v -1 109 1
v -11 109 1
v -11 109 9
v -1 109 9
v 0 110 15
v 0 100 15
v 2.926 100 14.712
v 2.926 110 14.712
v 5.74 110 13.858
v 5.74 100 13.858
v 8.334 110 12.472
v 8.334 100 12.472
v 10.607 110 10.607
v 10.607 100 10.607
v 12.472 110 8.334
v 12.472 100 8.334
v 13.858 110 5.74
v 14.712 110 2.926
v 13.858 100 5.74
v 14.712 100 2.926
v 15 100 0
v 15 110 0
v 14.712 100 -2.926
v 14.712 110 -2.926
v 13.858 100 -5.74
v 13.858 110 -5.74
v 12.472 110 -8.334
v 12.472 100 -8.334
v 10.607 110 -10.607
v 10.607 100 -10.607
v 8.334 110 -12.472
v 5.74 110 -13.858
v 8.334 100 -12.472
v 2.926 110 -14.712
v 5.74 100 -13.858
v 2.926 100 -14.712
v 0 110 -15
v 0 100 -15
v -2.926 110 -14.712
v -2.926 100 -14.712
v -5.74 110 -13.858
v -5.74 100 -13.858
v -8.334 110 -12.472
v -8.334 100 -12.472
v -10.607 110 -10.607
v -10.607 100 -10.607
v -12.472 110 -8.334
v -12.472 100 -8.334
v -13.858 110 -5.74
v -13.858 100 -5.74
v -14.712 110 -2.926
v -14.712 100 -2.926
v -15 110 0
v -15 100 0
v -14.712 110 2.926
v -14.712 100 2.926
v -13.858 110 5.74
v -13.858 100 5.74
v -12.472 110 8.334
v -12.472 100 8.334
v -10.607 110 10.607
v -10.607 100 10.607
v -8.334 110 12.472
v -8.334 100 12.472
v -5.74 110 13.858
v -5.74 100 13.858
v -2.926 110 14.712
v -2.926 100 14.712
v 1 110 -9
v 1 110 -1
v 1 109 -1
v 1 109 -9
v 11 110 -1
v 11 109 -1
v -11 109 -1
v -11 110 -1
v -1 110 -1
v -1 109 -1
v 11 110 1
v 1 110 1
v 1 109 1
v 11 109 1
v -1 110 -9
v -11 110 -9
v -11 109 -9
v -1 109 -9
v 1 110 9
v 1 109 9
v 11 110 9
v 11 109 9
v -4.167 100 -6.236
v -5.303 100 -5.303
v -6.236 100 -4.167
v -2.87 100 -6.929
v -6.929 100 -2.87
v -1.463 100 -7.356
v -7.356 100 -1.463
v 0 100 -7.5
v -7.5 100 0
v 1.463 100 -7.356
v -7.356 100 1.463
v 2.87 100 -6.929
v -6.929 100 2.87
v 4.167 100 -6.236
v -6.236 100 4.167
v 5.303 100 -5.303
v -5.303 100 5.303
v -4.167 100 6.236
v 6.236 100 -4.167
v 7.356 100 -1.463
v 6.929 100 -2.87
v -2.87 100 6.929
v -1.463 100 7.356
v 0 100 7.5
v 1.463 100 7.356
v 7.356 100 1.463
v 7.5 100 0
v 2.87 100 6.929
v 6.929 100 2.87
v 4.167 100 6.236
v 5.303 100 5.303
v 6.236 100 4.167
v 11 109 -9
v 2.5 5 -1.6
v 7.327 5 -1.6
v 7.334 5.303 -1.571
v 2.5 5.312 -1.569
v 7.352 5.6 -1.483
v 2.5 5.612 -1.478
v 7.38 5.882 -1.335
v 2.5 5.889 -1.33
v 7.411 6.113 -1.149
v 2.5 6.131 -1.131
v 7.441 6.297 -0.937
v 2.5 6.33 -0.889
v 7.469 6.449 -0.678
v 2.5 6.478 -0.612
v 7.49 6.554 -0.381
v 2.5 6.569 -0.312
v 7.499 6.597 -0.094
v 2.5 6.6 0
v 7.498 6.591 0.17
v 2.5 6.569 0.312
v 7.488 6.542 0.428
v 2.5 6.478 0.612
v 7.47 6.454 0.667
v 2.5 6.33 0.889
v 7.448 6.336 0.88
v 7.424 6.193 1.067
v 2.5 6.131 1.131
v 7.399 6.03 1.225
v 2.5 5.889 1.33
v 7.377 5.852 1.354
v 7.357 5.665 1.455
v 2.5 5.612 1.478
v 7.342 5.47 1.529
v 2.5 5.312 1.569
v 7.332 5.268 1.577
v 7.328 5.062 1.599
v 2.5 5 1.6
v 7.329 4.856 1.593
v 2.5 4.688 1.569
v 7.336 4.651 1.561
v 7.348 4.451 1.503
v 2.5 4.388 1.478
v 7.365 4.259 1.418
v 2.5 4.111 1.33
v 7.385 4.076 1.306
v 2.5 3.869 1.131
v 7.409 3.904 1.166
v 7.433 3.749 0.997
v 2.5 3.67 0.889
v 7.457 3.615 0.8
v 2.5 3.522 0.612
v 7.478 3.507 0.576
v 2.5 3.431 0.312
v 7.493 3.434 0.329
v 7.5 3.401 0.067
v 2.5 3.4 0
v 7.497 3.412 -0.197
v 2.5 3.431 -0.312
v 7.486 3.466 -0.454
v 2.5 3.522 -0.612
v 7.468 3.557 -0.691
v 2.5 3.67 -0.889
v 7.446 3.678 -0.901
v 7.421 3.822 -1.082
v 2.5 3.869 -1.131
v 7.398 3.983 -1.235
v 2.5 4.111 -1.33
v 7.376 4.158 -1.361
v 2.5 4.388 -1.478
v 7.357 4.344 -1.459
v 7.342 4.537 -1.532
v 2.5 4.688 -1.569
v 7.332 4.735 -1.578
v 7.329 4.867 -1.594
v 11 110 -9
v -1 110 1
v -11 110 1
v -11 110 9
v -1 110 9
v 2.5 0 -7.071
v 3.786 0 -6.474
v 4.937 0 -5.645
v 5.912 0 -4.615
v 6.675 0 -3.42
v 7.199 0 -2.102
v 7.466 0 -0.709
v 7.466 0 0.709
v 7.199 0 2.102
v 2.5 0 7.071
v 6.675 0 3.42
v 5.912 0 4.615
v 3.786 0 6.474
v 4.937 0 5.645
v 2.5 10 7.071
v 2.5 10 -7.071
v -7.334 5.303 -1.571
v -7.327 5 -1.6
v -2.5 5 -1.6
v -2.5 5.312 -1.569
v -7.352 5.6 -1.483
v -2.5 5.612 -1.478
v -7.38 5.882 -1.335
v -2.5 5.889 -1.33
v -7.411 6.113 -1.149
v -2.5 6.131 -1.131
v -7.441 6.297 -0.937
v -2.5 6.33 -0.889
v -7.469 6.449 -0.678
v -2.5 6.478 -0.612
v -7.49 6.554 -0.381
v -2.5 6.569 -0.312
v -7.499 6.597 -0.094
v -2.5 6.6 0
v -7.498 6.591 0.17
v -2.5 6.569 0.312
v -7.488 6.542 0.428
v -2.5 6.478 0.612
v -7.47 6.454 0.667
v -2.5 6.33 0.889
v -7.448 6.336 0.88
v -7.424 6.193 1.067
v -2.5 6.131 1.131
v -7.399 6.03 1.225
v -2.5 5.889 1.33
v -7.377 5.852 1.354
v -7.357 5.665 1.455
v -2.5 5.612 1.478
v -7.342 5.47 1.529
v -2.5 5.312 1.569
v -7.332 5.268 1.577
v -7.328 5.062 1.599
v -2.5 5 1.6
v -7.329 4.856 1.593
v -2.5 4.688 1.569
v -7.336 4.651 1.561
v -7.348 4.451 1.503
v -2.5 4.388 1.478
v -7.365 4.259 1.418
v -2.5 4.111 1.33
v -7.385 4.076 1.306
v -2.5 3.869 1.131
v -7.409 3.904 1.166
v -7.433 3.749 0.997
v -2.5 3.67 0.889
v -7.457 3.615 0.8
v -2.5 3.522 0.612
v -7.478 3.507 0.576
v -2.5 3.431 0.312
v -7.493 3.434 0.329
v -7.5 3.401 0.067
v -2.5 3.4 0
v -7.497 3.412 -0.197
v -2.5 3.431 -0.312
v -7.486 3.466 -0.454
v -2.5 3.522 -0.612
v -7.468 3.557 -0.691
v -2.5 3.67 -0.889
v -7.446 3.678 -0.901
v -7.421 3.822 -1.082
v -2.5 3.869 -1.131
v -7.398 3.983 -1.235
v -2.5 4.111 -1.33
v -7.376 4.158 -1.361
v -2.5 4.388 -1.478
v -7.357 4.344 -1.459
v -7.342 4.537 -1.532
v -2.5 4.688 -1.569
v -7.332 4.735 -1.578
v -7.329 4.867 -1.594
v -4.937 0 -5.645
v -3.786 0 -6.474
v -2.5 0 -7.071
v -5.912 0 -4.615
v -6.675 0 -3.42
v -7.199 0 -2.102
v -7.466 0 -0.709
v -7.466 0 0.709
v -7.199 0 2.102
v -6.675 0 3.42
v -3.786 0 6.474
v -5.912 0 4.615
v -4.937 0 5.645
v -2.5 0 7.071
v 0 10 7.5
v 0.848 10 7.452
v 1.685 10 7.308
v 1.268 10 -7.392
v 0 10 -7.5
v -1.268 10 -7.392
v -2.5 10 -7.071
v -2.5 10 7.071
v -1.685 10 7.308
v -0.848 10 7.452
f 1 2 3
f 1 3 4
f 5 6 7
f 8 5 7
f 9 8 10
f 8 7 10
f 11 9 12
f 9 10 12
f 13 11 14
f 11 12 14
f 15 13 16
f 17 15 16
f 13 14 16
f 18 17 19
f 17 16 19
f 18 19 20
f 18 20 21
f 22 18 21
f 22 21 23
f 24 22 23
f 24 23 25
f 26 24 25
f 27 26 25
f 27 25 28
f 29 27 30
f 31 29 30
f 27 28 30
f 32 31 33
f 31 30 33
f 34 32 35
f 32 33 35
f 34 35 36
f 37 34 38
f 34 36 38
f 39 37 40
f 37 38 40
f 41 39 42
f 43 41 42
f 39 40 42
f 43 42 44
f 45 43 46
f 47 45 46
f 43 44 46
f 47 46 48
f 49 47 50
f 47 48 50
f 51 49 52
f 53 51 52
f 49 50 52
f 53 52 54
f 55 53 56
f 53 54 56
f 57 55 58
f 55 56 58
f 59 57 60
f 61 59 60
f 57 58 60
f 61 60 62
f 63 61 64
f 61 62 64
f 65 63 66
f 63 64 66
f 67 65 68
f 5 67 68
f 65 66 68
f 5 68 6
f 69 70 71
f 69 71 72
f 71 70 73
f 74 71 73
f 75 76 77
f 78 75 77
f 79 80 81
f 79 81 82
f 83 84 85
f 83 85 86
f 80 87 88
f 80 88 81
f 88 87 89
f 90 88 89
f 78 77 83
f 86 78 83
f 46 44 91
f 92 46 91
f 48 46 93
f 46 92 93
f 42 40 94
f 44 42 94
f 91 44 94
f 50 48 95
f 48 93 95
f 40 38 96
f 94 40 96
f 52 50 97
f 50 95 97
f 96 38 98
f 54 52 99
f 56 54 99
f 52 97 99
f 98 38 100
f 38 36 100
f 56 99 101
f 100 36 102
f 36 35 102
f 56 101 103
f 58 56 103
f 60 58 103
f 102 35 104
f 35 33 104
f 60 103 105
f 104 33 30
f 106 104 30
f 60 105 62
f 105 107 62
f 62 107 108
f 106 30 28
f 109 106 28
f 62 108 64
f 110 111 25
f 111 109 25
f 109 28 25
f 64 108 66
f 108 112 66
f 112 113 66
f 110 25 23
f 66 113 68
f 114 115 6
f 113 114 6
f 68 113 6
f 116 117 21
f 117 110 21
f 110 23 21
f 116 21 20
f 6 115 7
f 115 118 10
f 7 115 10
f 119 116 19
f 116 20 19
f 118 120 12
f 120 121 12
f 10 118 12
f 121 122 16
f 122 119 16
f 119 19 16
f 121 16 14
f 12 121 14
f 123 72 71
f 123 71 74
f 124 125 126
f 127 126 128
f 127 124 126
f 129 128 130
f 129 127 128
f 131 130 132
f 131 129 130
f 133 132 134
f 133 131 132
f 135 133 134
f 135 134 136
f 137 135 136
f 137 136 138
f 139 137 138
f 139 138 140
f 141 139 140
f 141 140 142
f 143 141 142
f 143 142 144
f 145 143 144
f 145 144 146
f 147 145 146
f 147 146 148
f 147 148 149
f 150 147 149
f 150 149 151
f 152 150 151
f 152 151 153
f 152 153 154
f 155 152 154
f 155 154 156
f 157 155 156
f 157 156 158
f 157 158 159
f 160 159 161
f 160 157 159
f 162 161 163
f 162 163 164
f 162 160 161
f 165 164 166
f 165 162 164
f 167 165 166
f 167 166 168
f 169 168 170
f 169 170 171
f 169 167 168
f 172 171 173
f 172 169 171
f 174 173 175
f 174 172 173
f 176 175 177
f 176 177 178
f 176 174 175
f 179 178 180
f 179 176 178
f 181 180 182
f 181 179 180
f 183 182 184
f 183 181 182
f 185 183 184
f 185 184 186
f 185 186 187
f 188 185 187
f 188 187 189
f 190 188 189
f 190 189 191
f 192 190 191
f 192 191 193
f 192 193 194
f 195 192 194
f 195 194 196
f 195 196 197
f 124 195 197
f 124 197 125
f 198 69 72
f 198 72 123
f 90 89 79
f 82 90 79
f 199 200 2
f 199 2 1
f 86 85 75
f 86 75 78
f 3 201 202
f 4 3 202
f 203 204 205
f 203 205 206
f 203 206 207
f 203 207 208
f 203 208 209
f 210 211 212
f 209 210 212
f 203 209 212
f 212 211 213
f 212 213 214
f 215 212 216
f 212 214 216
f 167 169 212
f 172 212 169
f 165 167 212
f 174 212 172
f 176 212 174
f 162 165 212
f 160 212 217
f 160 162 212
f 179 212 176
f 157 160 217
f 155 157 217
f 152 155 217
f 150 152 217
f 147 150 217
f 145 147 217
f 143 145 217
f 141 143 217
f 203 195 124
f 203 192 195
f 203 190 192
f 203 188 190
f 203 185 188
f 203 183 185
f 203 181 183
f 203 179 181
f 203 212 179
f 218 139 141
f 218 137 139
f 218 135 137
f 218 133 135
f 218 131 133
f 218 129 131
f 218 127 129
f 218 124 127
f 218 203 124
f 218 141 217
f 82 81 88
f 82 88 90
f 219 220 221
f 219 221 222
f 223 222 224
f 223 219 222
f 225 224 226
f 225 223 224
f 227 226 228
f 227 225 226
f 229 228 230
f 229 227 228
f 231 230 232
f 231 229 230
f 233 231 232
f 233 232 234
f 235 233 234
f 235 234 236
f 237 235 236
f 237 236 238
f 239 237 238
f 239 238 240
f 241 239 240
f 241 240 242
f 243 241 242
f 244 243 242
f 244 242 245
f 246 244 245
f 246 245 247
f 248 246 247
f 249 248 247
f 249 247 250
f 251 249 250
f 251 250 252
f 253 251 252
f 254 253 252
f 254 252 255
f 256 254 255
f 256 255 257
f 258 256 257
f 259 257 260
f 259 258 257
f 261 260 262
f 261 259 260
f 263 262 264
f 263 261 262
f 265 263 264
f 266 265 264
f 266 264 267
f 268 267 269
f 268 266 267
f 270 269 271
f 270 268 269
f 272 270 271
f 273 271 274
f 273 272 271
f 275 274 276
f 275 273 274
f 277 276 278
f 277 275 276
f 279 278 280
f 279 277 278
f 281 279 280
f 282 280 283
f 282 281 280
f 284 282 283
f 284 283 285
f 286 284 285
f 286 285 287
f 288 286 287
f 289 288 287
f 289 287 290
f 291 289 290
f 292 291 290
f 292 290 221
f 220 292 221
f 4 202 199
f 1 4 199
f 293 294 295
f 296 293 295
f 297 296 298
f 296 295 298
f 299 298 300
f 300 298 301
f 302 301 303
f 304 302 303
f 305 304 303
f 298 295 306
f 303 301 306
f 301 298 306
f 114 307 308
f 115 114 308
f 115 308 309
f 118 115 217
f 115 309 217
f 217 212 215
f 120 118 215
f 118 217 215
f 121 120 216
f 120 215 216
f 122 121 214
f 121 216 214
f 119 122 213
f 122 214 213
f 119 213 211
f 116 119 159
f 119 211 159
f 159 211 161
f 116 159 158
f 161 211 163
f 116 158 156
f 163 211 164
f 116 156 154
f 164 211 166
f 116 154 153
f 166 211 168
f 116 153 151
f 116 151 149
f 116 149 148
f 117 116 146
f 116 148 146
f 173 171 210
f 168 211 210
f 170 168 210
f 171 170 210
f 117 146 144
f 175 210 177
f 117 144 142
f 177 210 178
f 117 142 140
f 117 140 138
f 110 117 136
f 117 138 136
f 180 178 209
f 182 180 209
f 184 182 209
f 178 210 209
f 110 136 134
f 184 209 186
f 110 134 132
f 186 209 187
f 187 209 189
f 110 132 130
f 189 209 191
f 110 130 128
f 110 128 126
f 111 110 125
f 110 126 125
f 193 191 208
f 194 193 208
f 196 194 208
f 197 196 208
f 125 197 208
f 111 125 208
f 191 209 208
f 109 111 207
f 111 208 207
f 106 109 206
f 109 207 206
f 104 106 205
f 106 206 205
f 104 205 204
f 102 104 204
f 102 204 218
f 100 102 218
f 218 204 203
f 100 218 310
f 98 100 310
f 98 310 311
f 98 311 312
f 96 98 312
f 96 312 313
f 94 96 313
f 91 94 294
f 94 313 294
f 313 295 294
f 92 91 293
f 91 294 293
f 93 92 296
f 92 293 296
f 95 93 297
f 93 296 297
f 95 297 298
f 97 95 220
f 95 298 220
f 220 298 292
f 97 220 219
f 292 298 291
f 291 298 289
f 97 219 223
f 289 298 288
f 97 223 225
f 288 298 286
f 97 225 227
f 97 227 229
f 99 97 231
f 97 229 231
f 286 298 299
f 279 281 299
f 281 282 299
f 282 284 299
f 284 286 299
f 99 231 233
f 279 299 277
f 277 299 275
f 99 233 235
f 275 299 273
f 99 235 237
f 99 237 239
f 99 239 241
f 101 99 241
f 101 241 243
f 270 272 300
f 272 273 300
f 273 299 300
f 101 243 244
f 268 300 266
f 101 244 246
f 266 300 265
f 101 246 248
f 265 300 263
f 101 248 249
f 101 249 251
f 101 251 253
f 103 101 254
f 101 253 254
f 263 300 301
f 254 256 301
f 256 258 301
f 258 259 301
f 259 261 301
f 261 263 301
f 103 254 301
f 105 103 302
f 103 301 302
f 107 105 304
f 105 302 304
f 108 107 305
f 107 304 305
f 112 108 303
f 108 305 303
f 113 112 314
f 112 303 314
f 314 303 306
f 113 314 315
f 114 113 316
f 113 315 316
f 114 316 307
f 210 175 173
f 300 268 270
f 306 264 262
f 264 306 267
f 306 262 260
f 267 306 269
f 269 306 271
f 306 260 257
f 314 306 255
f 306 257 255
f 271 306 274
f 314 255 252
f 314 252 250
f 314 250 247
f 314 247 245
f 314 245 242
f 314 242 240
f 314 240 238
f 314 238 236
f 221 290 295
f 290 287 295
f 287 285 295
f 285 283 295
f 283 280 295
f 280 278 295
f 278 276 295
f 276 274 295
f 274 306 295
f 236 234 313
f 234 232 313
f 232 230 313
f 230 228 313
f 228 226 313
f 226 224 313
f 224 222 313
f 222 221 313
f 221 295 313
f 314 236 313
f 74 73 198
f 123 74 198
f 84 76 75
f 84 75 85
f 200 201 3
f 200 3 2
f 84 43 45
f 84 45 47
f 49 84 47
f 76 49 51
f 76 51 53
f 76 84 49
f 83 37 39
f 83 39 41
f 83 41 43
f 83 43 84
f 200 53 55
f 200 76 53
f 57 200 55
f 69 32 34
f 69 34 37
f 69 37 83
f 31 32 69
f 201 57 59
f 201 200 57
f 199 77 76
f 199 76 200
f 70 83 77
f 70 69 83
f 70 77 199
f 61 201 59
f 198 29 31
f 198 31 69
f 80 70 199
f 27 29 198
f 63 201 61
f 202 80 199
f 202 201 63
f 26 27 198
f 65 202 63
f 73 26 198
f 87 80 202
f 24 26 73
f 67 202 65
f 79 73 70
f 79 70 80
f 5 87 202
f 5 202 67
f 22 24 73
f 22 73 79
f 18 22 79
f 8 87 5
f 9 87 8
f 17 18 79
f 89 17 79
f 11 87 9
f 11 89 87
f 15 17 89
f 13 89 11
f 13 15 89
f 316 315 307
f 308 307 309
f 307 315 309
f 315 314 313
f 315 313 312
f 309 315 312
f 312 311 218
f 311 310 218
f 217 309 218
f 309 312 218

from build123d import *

# Parameters (mm, degrees)
SKETCH_1_R               = 7.5
EXTRUDE_1_DEPTH          = 100
SKETCH_2_R               = 15
EXTRUDE_2_DEPTH          = 10
CUT_EXTRUDE_1_DEPTH      = 113.026782512
CUT_EXTRUDE_1_DEPTH_BACK = 113.026782512
SKETCH_3_W               = 5
SKETCH_3_H               = 10
CUT_EXTRUDE_2_DEPTH      = 113.026782512
CUT_EXTRUDE_2_DEPTH_BACK = 113.026782512
SKETCH_4_R               = 1.6
SKETCH_5_W               = 10
SKETCH_5_H               = 8
CUT_EXTRUDE_3_DEPTH      = 1


with BuildPart() as part:
    # ｽｹｯﾁ1 → ﾎﾞｽ - 押し出し1 (new body)
    with BuildSketch(Plane(origin=(0, 0, 0), x_dir=(1, 0, 0), z_dir=(0, 1, 0))):
        with Locations(Location((0, 0, 0), (0, 0, 270))):
            Circle(SKETCH_1_R)
    extrude(amount=EXTRUDE_1_DEPTH)

    # ｽｹｯﾁ2 → ﾎﾞｽ - 押し出し2 (add)
    with BuildSketch(Plane(origin=(0, 100, 0), x_dir=(1, 0, 0), z_dir=(0, 1, 0))):
        with Locations(Location((0, 0, 0), (0, 0, 270))):
            Circle(SKETCH_2_R)
    extrude(amount=EXTRUDE_2_DEPTH)

    # ｽｹｯﾁ3 → ｶｯﾄ - 押し出し1 (cut, two sides: drawn at the far end of the back side and taken through both)
    with BuildSketch(Plane.XY.offset(-CUT_EXTRUDE_1_DEPTH_BACK)):
        with Locations((0, 5)):
            Rectangle(SKETCH_3_W, SKETCH_3_H)
    extrude(amount=CUT_EXTRUDE_1_DEPTH + CUT_EXTRUDE_1_DEPTH_BACK, mode=Mode.SUBTRACT)

    # ｽｹｯﾁ4 → ｶｯﾄ - 押し出し2 (cut, two sides: drawn at the far end of the back side and taken through both)
    with BuildSketch(Plane(origin=(0, 0, 0), x_dir=(0, 0, -1), z_dir=(1, 0, 0)).offset(-CUT_EXTRUDE_2_DEPTH_BACK)):
        with Locations((0, 5)):
            Circle(SKETCH_4_R)
    extrude(amount=CUT_EXTRUDE_2_DEPTH + CUT_EXTRUDE_2_DEPTH_BACK, mode=Mode.SUBTRACT)

    # ｽｹｯﾁ5 → ｶｯﾄ - 押し出し3 (cut)
    with BuildSketch(Plane(origin=(0, 110, 0), x_dir=(1, 0, 0), z_dir=(0, 1, 0))):
        with Locations((-6, 5)):
            Rectangle(SKETCH_5_W, SKETCH_5_H)
        with Locations((6, 5)):
            Rectangle(SKETCH_5_W, SKETCH_5_H)
        with Locations((6, -5)):
            Rectangle(SKETCH_5_W, SKETCH_5_H)
        with Locations((-6, -5)):
            Rectangle(SKETCH_5_W, SKETCH_5_H)
    extrude(amount=-CUT_EXTRUDE_3_DEPTH, mode=Mode.SUBTRACT)


solid = part.part
